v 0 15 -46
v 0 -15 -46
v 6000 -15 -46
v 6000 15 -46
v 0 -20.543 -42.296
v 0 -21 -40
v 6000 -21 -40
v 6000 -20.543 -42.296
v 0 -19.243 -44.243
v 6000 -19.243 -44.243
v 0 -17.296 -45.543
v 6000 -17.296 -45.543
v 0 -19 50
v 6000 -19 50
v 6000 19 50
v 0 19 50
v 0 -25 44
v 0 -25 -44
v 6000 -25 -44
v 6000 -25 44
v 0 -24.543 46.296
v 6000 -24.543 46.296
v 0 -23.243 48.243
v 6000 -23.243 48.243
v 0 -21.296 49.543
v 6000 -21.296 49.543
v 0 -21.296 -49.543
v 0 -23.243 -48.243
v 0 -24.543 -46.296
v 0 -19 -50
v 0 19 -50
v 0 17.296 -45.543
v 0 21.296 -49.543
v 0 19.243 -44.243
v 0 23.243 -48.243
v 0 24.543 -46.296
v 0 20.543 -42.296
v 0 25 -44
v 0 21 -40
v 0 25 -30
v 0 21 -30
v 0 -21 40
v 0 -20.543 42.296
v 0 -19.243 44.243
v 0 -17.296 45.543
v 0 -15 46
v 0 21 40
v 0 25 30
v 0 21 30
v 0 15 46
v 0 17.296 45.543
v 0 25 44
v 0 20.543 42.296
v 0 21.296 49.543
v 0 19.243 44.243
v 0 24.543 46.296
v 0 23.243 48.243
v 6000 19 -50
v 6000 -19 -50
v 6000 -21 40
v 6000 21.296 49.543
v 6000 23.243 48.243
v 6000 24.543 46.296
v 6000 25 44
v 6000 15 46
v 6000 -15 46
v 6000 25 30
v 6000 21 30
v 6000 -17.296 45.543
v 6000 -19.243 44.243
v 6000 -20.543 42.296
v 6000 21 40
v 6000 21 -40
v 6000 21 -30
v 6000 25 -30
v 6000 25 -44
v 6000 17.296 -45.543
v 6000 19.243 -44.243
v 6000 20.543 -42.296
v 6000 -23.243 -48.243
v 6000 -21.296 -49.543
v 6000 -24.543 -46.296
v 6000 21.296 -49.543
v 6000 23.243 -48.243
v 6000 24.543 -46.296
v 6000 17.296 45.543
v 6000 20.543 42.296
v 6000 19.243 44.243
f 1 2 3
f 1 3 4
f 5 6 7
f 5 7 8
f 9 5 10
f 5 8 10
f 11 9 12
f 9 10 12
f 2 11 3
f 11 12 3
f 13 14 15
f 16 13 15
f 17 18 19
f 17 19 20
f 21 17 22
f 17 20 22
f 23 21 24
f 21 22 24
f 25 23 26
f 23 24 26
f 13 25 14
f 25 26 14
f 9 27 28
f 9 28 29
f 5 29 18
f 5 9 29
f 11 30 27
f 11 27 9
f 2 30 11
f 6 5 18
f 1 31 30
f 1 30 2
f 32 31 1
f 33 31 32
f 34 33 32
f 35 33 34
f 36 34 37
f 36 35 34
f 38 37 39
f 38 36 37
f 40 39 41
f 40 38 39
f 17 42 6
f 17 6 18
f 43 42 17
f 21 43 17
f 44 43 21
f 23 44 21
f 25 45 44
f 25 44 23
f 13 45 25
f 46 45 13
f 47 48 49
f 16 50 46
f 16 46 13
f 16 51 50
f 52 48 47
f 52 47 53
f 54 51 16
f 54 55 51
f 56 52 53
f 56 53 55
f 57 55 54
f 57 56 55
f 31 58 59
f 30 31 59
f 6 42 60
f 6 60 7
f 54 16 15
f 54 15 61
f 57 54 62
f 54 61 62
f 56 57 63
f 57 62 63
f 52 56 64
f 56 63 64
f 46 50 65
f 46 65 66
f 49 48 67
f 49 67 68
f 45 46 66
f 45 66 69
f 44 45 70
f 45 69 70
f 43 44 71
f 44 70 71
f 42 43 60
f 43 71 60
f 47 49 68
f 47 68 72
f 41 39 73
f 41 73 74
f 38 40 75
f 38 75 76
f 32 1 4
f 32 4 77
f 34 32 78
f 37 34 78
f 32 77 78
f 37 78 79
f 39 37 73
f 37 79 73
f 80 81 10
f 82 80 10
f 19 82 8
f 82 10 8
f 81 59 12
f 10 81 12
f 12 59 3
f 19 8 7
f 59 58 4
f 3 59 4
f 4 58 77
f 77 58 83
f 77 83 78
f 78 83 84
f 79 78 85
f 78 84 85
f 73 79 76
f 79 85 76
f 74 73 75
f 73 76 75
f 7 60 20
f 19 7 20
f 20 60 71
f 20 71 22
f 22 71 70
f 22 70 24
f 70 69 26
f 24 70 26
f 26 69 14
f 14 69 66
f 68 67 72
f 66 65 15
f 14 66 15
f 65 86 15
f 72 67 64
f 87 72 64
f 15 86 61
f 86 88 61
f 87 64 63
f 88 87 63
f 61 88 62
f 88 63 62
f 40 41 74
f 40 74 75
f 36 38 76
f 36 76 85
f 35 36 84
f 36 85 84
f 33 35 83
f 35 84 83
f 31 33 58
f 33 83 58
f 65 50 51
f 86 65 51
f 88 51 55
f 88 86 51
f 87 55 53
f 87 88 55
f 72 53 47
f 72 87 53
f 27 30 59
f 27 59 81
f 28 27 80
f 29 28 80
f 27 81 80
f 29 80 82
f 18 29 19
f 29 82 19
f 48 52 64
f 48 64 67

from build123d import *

# Parameters (mm, degrees)
RESSALTO_EXTRUS_O1_DEPTH = 6000
FILETE1_R                = 6


with BuildPart() as part:
    # Esboço1 → Ressalto-extrusão1 (new body)
    with BuildSketch(Plane(origin=(0, 0, 0), x_dir=(0, 0, -1), z_dir=(1, 0, 0))):
        Polygon((-46, 21), (-46, -21), (46, -21), (46, 21), (30, 21), (30, 25), (50, 25), (50, -25), (-50, -25), (-50, 25), (-30, 25), (-30, 21), align=None)
    extrude(amount=RESSALTO_EXTRUS_O1_DEPTH)

    # Filete1
    filete1_edges = [part.edges().sort_by_distance(p)[0] for p in [
        (3000, -25, -50),
        (3000, -25, 50),
        (3000, 25, 50),
        (3000, 21, 46),
        (3000, -21, 46),
        (3000, -21, -46),
        (3000, 21, -46),
        (3000, 25, -50),
    ]]
    fillet(filete1_edges, radius=FILETE1_R)


solid = part.part
